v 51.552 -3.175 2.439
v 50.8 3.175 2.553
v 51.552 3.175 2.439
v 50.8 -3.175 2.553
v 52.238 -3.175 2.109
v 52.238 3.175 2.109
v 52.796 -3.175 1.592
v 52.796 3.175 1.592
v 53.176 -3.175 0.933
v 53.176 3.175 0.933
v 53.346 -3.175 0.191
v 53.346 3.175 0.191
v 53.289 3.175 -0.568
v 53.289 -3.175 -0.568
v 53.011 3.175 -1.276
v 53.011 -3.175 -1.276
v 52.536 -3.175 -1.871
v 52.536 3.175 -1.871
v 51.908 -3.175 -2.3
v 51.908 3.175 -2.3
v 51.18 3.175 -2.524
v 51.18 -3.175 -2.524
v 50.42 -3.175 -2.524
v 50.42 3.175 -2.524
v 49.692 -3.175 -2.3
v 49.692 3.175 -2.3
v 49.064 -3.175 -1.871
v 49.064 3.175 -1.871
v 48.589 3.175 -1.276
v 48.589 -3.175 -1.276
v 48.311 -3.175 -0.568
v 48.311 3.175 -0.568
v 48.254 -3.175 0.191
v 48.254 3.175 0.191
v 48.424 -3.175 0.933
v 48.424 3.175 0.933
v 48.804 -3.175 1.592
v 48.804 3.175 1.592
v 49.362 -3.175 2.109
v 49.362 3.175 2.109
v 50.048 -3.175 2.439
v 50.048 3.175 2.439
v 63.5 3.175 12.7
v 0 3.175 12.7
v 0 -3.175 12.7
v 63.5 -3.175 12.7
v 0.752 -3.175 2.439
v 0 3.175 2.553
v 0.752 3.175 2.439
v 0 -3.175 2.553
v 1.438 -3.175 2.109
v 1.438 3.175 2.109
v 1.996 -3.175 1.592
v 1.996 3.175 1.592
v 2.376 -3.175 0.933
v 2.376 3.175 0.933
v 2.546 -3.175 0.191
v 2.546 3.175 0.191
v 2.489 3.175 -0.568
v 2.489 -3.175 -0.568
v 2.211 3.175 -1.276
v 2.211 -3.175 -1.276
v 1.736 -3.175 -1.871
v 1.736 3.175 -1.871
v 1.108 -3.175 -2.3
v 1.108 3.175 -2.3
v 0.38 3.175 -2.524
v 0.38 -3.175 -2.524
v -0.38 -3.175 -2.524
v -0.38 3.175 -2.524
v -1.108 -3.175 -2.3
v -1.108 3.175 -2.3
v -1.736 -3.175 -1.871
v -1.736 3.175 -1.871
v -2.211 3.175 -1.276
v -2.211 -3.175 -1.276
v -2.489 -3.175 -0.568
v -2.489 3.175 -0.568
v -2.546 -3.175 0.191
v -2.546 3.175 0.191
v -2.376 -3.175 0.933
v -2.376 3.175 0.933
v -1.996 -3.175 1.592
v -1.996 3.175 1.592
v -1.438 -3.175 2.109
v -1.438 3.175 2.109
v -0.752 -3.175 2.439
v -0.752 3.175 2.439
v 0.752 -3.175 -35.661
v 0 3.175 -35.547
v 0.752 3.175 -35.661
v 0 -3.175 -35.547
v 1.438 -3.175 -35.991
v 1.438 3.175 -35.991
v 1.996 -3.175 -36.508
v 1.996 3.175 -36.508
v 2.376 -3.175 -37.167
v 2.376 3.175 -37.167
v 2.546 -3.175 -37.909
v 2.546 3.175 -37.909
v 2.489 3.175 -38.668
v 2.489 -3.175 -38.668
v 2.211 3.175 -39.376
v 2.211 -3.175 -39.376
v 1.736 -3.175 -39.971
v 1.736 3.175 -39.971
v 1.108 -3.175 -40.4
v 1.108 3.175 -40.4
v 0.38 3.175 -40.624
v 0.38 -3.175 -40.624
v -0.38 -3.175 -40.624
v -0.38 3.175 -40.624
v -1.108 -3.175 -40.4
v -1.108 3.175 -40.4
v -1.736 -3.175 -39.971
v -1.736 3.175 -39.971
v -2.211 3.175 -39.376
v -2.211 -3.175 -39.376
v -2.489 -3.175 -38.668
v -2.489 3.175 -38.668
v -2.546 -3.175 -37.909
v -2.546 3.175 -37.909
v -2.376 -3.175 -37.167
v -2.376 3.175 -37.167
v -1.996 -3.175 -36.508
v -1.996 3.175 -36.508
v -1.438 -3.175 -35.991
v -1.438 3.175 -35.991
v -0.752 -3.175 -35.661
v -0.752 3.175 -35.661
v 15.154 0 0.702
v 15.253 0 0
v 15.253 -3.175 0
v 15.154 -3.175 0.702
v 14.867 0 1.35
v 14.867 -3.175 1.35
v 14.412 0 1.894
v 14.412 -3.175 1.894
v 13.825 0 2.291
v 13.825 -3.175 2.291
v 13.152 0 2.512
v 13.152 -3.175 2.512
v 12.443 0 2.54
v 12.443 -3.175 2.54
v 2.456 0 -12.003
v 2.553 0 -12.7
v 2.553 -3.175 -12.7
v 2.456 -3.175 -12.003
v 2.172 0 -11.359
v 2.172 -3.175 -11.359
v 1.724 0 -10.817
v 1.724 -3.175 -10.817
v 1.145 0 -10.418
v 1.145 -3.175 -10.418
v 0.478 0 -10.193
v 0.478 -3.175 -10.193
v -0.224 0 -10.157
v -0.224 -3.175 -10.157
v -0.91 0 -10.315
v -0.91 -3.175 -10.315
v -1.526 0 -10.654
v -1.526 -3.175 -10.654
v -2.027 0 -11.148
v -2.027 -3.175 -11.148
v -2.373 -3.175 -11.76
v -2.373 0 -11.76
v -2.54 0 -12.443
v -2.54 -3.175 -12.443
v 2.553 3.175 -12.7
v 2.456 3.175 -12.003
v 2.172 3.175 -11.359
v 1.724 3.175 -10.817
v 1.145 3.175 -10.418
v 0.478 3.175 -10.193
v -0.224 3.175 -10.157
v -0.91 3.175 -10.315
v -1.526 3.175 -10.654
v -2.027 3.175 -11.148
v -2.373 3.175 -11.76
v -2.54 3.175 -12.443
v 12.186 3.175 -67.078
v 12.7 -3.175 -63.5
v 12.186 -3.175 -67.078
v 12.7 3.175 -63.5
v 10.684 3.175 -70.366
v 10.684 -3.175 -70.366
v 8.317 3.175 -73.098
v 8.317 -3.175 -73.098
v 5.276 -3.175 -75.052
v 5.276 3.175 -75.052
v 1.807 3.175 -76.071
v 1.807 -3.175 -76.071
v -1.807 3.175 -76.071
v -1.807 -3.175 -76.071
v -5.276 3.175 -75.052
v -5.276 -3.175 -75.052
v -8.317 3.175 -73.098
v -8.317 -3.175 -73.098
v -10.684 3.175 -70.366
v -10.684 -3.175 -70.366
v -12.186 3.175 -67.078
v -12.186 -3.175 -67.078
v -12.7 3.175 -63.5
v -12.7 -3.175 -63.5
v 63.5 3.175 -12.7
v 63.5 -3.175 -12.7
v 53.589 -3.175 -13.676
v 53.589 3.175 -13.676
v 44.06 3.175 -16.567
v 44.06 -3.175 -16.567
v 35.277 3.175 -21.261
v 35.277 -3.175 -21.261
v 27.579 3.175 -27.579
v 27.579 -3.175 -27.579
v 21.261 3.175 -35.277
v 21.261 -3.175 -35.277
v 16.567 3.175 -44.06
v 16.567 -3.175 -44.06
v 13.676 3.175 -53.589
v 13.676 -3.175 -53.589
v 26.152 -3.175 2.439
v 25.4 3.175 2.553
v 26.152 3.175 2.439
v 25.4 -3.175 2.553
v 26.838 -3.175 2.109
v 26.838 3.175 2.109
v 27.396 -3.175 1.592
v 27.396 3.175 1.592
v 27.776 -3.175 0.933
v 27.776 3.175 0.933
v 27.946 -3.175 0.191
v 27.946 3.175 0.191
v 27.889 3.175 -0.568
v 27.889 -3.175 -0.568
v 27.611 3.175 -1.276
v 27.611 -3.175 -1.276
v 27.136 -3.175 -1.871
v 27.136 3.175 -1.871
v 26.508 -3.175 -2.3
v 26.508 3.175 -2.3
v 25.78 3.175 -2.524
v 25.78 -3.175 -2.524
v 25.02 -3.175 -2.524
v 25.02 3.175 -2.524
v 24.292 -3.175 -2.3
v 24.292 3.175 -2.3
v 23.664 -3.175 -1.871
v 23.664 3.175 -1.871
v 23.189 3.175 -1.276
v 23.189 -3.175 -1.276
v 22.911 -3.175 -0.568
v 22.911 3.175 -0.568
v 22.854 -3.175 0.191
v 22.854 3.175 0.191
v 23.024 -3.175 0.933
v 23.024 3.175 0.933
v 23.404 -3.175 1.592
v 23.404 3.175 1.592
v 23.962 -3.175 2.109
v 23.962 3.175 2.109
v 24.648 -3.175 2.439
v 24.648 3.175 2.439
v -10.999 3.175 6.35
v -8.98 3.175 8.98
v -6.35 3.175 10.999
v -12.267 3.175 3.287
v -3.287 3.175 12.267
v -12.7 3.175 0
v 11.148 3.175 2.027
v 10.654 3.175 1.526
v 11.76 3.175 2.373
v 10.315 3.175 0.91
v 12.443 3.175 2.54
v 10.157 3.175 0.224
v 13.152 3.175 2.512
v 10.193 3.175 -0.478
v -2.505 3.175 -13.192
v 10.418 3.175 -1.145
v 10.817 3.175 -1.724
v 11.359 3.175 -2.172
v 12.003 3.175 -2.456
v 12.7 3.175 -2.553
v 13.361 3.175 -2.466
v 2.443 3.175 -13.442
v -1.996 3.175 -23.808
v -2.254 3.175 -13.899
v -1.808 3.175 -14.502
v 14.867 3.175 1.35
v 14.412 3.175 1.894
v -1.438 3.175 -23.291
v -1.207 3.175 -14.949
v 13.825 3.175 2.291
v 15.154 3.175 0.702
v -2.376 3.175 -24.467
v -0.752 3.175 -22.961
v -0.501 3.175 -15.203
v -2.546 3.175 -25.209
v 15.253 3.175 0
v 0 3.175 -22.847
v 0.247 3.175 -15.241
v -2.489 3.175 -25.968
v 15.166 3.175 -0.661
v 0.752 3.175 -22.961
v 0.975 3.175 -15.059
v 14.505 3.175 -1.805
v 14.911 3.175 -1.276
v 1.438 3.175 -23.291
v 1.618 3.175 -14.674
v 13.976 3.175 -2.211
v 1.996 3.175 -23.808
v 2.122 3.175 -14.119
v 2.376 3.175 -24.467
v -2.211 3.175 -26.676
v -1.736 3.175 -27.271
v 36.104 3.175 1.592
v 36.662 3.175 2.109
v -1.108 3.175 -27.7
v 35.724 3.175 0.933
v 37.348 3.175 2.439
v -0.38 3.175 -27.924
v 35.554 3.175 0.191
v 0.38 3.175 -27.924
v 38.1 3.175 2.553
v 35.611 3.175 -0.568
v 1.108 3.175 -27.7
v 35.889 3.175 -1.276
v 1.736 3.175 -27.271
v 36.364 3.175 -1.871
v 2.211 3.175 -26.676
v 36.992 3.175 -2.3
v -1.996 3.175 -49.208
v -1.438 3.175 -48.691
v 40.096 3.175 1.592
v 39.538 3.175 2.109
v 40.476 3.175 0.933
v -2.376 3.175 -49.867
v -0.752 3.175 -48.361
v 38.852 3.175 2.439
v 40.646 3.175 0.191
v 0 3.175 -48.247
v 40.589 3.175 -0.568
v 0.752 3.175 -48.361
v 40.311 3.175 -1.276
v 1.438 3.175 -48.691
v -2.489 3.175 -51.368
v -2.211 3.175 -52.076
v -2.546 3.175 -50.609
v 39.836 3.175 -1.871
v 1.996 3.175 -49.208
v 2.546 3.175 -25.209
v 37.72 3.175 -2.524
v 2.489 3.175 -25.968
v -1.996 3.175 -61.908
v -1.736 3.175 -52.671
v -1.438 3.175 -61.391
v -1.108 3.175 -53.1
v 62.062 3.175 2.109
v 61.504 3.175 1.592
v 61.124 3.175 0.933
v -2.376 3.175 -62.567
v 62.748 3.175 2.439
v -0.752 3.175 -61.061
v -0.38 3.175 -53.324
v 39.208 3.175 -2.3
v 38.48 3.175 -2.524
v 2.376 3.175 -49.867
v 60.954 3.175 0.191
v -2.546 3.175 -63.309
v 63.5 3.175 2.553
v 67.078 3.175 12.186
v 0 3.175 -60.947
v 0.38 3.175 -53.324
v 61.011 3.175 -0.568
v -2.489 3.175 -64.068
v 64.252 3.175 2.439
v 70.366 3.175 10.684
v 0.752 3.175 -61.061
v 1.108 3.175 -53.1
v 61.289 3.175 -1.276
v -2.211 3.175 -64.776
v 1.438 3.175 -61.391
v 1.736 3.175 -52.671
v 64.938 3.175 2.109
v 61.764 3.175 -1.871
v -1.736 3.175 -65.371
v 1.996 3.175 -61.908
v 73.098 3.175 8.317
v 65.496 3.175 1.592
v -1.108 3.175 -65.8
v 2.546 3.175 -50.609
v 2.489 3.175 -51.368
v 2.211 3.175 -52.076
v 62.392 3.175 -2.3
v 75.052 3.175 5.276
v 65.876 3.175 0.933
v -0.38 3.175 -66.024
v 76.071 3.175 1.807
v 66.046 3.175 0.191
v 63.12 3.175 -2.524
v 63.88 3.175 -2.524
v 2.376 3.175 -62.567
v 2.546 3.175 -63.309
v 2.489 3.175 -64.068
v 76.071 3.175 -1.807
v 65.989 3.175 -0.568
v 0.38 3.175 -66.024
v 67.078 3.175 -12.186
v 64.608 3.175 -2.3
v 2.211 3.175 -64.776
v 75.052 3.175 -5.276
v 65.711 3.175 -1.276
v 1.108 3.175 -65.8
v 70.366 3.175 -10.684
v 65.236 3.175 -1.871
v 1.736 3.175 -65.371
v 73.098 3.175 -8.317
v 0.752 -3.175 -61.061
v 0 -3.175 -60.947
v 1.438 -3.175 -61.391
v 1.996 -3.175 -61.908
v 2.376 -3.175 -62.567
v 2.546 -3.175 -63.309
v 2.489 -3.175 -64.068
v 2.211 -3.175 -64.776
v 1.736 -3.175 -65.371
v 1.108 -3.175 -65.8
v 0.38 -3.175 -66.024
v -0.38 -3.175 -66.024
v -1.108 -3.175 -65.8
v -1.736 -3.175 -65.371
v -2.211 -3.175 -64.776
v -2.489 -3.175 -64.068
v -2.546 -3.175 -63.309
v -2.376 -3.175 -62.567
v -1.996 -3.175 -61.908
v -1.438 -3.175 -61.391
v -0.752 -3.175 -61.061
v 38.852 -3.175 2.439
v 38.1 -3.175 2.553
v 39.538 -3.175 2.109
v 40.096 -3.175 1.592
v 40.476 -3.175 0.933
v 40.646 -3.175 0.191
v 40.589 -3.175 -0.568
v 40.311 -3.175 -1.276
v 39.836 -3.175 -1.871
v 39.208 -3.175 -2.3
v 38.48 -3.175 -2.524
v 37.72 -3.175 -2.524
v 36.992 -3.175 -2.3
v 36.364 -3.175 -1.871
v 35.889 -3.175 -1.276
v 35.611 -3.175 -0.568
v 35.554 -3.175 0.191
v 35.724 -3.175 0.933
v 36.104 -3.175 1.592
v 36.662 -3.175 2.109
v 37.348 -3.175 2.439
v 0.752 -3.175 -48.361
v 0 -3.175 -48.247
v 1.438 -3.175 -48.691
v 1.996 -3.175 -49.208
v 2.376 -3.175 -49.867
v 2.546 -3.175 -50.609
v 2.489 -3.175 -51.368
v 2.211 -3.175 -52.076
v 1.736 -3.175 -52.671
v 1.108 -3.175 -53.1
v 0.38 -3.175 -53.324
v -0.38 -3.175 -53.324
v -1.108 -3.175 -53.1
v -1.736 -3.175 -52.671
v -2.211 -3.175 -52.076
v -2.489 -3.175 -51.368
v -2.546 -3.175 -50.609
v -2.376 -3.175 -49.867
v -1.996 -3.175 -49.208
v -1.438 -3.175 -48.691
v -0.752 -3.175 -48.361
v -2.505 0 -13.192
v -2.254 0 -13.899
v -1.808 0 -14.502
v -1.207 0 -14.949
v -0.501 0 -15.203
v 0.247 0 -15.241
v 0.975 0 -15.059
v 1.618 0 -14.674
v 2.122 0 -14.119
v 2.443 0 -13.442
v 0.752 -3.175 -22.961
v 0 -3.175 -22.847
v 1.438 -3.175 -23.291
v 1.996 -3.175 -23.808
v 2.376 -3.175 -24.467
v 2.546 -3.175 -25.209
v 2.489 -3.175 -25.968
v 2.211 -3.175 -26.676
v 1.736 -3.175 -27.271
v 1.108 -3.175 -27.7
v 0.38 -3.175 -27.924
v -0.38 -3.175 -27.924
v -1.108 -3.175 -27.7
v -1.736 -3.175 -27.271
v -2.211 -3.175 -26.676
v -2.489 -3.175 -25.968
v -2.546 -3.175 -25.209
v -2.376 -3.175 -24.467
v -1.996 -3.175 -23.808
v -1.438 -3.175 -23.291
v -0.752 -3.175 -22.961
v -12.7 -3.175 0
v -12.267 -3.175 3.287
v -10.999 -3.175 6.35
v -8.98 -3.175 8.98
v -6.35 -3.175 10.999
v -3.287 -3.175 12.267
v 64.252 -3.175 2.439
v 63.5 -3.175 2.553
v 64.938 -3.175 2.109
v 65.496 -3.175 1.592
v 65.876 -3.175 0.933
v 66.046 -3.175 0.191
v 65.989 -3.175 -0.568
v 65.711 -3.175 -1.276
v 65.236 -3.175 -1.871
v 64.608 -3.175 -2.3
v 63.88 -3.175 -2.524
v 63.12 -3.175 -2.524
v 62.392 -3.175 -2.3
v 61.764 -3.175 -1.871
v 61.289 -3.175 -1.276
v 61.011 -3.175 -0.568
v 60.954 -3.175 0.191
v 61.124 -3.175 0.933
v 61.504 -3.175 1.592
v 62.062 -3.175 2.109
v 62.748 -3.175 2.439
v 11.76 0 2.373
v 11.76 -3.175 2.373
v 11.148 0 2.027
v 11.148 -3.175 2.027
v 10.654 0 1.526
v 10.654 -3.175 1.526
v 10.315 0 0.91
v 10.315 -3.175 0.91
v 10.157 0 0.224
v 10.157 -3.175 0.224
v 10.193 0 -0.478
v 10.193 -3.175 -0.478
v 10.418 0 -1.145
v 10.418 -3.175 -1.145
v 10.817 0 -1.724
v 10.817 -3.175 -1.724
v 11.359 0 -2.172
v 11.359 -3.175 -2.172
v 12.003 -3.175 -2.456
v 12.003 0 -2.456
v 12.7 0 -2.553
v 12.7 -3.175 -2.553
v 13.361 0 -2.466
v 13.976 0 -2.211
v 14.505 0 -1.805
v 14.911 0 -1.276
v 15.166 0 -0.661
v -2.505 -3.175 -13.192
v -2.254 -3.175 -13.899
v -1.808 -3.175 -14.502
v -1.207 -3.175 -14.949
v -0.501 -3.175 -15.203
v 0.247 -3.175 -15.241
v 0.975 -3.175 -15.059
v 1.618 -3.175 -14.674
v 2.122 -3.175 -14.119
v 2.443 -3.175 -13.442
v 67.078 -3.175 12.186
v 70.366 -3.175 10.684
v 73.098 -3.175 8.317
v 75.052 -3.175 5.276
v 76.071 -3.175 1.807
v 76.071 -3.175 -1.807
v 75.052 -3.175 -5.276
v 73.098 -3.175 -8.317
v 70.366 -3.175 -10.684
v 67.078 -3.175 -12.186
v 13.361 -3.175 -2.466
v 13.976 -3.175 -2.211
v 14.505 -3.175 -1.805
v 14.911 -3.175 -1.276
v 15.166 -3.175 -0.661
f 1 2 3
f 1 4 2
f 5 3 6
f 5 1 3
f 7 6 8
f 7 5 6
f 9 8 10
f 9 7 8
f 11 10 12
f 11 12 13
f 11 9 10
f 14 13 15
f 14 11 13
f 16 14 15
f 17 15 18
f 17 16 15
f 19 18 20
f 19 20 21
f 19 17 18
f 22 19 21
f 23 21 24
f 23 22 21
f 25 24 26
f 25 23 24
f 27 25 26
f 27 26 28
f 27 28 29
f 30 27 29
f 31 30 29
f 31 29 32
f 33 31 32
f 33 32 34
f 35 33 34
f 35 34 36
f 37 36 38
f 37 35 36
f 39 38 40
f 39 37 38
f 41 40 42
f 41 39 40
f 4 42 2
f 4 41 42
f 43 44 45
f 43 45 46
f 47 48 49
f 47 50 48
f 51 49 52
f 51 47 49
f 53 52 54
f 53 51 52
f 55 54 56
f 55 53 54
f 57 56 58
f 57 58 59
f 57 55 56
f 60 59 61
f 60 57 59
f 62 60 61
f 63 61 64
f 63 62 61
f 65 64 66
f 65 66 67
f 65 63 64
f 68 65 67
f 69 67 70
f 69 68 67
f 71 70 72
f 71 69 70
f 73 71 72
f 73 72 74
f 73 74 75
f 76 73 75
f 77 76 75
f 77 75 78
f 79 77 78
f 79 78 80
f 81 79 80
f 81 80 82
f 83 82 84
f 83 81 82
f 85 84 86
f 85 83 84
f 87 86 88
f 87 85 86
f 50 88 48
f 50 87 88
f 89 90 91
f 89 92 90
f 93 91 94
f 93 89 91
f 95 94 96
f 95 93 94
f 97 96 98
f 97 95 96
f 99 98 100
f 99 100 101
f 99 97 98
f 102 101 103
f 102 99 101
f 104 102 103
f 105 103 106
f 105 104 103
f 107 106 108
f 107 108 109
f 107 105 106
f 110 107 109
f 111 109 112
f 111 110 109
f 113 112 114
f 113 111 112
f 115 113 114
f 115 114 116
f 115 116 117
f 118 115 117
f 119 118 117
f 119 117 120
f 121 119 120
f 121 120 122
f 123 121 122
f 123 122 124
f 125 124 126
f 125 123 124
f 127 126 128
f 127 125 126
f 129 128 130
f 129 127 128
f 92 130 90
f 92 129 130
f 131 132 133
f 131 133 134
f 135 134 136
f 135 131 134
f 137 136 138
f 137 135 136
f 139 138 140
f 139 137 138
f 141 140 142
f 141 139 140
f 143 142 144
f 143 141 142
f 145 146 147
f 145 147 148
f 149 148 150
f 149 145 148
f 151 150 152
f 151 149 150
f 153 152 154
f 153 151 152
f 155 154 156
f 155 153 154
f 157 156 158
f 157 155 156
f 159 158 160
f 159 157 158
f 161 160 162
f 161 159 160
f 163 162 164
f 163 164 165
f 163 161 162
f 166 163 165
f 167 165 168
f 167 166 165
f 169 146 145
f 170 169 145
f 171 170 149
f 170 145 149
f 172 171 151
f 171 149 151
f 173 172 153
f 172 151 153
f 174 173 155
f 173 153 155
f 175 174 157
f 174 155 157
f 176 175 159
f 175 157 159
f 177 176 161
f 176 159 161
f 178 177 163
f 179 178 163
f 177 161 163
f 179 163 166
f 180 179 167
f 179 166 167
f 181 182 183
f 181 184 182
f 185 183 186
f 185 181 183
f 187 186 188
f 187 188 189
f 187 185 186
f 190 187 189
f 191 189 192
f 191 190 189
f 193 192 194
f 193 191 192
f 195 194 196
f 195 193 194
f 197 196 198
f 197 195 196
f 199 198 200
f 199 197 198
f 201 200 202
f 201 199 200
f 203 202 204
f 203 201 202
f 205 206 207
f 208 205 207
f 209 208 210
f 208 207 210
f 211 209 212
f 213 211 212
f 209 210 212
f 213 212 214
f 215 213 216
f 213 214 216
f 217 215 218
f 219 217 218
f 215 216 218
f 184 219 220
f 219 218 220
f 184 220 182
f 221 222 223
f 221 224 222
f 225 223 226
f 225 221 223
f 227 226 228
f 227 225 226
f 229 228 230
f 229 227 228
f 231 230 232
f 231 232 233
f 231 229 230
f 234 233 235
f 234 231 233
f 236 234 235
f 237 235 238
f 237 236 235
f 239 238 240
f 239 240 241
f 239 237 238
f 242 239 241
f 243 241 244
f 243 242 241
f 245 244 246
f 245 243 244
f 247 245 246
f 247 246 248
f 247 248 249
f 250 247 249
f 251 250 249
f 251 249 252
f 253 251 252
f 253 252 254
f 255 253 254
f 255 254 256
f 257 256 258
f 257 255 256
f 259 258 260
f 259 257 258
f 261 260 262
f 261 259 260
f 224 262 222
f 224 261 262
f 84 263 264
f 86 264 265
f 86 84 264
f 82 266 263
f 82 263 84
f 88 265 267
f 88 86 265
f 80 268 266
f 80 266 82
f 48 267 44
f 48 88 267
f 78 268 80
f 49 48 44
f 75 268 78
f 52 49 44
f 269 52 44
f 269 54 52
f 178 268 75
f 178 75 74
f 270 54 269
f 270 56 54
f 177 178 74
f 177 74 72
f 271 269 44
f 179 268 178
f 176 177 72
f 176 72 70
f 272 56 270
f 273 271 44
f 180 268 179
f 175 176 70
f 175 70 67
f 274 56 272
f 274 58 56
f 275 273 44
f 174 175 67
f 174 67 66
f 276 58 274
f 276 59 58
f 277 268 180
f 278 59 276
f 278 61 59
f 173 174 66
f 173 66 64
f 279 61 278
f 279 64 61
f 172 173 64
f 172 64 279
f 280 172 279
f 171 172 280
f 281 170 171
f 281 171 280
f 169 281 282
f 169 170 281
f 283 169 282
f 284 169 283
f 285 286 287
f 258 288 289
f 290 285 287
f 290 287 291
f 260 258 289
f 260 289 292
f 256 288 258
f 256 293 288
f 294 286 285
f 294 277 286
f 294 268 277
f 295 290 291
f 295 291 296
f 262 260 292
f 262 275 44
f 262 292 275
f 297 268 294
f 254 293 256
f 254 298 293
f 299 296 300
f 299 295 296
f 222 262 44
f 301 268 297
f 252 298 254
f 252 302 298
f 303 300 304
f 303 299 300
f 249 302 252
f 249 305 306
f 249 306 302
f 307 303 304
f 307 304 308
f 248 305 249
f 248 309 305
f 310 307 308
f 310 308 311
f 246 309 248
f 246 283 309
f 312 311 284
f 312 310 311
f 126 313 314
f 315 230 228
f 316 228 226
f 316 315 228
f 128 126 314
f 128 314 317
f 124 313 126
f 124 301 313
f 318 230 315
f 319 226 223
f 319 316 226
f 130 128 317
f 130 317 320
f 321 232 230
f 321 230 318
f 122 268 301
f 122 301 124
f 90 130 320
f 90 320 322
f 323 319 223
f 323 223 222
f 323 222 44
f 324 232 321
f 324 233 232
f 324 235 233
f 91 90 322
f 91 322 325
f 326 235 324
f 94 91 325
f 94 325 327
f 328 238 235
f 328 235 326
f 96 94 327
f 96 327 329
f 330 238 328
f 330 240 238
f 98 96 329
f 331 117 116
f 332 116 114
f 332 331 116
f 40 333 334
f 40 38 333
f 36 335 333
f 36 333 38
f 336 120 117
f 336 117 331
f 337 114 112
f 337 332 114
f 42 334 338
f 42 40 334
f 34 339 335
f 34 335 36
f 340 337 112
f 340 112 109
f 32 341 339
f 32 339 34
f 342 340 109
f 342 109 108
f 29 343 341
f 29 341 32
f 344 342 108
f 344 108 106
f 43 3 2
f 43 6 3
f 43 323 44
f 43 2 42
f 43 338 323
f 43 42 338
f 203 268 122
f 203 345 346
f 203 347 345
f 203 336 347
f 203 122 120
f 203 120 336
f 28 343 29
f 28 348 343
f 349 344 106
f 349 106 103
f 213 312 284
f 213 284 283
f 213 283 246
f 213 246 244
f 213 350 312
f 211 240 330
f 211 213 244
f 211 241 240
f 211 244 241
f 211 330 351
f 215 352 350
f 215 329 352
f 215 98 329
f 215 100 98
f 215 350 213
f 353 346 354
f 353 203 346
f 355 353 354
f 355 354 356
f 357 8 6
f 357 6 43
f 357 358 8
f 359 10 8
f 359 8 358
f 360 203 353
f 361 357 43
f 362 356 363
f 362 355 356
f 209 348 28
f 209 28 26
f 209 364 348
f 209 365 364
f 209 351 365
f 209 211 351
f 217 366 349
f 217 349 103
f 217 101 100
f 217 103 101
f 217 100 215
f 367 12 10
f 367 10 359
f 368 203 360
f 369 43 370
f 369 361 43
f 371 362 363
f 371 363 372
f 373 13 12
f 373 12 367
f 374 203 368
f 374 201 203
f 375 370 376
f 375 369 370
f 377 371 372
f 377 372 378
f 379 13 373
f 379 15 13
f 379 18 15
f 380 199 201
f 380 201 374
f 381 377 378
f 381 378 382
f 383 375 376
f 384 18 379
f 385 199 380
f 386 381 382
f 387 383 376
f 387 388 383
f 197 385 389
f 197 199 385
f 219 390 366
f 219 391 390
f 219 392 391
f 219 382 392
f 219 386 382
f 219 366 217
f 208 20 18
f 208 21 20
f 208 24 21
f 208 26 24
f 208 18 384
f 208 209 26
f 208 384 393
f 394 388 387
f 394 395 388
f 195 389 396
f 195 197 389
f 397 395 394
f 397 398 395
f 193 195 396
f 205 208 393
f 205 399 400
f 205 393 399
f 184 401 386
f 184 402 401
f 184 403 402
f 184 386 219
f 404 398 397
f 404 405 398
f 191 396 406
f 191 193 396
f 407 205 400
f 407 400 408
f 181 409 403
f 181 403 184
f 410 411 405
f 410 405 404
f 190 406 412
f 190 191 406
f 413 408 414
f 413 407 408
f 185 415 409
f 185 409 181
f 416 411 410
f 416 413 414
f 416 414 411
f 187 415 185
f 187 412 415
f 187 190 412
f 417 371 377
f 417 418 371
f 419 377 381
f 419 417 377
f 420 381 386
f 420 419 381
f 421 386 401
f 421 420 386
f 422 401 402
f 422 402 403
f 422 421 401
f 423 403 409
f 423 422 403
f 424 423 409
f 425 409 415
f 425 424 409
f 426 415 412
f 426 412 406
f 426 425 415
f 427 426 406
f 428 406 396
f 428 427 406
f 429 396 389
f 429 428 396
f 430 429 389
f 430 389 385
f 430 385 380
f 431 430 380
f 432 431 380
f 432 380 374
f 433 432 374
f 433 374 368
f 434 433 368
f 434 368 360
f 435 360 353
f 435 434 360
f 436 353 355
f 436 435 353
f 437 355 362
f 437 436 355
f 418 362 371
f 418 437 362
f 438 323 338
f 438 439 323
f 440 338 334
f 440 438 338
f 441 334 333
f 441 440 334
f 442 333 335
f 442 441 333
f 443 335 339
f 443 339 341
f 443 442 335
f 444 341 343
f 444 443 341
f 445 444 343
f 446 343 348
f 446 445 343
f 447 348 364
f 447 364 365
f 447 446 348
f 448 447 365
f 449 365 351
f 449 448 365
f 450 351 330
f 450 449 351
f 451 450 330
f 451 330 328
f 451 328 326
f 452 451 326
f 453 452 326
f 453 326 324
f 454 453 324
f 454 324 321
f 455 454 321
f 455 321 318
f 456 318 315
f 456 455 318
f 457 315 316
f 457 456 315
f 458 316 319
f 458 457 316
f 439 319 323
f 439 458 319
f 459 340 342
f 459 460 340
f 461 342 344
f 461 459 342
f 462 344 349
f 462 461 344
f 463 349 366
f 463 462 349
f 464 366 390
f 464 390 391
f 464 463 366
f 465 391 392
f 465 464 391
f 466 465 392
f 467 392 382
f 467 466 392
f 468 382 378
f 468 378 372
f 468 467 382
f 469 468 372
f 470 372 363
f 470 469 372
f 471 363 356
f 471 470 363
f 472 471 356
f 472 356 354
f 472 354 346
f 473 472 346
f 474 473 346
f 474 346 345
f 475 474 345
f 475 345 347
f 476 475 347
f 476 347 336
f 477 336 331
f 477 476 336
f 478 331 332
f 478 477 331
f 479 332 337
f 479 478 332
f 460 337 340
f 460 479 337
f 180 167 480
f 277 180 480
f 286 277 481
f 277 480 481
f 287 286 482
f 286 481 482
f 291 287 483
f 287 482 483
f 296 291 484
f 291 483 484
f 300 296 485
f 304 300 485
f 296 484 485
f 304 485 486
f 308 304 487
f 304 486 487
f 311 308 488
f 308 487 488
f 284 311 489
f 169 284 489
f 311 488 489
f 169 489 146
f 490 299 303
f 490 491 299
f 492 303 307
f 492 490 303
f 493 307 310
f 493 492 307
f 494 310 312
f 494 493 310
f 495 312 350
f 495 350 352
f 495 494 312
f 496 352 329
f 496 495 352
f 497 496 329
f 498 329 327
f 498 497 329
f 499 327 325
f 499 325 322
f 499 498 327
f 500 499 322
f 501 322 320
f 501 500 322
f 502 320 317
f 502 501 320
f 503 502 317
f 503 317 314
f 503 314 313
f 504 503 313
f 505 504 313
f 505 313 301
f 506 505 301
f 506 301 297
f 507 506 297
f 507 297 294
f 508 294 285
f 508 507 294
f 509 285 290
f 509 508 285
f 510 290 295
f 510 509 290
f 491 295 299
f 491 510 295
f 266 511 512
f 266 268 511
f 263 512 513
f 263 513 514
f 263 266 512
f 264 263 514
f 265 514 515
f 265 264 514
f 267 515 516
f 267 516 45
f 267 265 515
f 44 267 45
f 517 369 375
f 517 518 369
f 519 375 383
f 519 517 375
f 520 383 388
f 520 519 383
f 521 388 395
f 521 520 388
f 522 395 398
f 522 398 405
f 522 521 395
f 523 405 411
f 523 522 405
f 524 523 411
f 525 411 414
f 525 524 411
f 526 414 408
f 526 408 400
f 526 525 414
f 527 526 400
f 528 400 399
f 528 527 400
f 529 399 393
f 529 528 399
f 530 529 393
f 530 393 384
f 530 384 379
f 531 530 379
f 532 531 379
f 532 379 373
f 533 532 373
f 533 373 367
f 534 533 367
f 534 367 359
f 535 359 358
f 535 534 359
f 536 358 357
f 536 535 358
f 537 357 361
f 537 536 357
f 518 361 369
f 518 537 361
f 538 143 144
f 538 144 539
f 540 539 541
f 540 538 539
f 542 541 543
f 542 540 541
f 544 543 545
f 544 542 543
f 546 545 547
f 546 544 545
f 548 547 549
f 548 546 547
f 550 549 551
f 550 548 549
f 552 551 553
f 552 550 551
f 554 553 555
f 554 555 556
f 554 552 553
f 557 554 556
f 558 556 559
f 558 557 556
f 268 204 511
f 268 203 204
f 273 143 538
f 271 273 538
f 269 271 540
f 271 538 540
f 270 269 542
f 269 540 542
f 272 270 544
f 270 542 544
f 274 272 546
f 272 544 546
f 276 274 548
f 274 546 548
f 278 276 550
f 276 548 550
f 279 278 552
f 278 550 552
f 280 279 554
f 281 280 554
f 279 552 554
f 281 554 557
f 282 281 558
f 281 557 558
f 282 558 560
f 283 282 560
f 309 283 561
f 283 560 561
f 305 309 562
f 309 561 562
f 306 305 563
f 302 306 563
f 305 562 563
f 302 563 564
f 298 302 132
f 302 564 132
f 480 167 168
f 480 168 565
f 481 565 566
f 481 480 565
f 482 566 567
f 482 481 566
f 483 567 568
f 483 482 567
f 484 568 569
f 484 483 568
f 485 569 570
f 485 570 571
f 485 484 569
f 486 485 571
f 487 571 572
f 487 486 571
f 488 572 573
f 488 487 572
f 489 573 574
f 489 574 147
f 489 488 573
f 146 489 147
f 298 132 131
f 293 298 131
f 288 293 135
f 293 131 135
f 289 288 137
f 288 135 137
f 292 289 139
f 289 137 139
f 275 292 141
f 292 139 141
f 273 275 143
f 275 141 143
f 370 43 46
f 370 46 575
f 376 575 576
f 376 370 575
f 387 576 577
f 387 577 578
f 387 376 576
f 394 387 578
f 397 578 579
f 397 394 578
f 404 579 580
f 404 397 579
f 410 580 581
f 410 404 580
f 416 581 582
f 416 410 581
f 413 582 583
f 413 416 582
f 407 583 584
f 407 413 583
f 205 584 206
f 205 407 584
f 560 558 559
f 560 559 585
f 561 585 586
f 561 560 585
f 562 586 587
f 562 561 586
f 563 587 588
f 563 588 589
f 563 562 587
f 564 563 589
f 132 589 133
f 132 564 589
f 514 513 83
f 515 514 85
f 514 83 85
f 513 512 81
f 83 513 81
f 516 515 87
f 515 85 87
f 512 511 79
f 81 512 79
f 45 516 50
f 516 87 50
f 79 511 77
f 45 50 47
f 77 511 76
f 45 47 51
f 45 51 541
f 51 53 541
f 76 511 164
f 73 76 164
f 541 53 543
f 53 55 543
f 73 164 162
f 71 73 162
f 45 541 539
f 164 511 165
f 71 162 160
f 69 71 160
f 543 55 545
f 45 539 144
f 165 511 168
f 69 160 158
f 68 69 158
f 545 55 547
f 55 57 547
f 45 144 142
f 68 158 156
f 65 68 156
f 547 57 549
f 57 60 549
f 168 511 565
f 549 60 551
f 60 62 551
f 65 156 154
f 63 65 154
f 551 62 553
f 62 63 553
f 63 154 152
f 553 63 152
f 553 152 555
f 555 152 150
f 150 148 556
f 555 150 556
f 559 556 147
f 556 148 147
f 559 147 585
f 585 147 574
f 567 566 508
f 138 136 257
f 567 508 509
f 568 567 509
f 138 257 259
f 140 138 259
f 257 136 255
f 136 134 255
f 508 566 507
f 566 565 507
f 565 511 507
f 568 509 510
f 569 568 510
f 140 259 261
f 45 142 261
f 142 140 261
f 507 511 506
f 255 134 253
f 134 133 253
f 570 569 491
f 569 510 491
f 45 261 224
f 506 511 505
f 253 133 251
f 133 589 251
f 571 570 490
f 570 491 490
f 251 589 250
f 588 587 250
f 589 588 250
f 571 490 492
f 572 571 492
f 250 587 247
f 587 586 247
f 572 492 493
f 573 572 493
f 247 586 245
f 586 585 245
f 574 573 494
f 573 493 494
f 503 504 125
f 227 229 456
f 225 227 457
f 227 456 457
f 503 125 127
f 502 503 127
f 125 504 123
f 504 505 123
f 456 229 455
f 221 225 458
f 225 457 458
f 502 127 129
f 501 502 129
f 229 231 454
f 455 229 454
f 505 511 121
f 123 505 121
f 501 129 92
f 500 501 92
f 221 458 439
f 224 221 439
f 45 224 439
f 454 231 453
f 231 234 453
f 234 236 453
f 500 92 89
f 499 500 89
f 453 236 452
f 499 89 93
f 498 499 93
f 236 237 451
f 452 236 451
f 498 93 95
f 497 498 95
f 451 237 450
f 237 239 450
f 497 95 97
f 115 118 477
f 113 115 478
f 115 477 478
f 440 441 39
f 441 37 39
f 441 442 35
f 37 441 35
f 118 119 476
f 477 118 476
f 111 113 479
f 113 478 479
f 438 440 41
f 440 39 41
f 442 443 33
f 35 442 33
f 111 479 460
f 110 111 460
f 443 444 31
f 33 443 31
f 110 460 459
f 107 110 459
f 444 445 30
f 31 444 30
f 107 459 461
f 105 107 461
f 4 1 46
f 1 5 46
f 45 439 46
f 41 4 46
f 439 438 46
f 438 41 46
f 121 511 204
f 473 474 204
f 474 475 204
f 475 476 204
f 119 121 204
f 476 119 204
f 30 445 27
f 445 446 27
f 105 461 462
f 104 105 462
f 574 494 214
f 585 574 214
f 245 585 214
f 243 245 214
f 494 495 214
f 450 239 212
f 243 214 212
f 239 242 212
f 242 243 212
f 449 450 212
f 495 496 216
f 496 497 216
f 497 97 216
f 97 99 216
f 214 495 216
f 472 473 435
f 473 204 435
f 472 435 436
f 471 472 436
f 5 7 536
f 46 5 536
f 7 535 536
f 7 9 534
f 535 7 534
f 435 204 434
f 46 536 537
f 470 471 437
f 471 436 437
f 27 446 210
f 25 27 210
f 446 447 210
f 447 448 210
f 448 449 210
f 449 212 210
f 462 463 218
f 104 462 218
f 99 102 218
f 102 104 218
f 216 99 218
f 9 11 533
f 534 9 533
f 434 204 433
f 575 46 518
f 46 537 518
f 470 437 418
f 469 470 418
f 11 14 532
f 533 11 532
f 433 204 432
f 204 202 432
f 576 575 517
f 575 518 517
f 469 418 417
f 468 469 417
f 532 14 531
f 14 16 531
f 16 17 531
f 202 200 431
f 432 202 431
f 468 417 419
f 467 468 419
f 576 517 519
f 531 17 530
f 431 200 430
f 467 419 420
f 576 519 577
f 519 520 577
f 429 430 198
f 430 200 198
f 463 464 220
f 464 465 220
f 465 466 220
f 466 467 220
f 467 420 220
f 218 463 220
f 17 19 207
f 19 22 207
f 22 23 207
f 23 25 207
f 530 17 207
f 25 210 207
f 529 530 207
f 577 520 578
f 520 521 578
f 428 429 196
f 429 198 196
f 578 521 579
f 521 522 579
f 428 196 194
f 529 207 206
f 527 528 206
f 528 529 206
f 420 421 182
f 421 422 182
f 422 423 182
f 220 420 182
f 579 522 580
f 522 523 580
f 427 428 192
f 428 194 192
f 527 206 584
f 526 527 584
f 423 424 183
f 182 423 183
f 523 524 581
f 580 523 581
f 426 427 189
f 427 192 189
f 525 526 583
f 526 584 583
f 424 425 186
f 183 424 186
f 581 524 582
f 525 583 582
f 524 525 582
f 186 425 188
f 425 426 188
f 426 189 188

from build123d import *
from build123d.topology import SkipClean

# Parameters (mm, degrees)
SKETCH1_R           = 2.5527
BOSS_EXTRUDE1_DEPTH = 3.175


with BuildPart() as part:
    # Sketch1 → Boss-Extrude1 (new, symmetric)
    # profile 1 of 4: a face of its own
    with SkipClean():  # the faces are left unmerged after this step: merging them gives an invalid solid
        with BuildSketch(Plane(origin=(0, 0, 0), x_dir=(1, 0, 0), z_dir=(0, 1, 0))):
            with BuildLine():
                Line((-12.7, 63.5), (-12.7, 0))
                ThreePointArc((-12.7, 0), (-9.837305348, 8.032273868), (-2.539775829, 12.44345365))
                ThreePointArc((-2.539775829, 12.44345365), (-0.128435844, 15.24946691), (2.5527, 12.7))
                Line((2.5527, 12.7), (12.7, 12.7))
                Line((12.7, 12.7), (12.7, 63.5))
                ThreePointArc((12.7, 63.5), (0, 76.2), (-12.7, 63.5))
            make_face()
            with Locations(Location((0, 25.4, 0), (0, 0, 270))):
                Circle(SKETCH1_R, mode=Mode.SUBTRACT)
            with Locations(Location((0, 38.1, 0), (0, 0, 270))):
                Circle(SKETCH1_R, mode=Mode.SUBTRACT)
            with Locations(Location((0, 50.8, 0), (0, 0, 270))):
                Circle(SKETCH1_R, mode=Mode.SUBTRACT)
            with Locations(Location((0, 63.5, 0), (0, 0, 270))):
                Circle(SKETCH1_R, mode=Mode.SUBTRACT)
        # profile 2 of 4: a face of its own
        with BuildSketch(Plane(origin=(0, 0, 0), x_dir=(1, 0, 0), z_dir=(0, 1, 0))):
            with BuildLine():
                Line((12.7, 12.7), (63.5, 12.7))
                ThreePointArc((63.5, 12.7), (27.578975516, 27.578975516), (12.7, 63.5))
                Line((12.7, 63.5), (12.7, 12.7))
            make_face()
        # profile 3 of 4: a face of its own
        with BuildSketch(Plane(origin=(0, 0, 0), x_dir=(1, 0, 0), z_dir=(0, 1, 0))):
            with BuildLine():
                Line((0, -12.7), (63.5, -12.7))
                ThreePointArc((63.5, -12.7), (76.2, 0), (63.5, 12.7))
                Line((63.5, 12.7), (12.7, 12.7))
                Line((12.7, 12.7), (12.7, 2.5527))
                ThreePointArc((12.7, 2.5527), (14.50503148, 1.80503148), (15.2527, 0))
                ThreePointArc((15.2527, 0), (14.411927484, -1.893563196), (12.44345365, -2.539775829))
                ThreePointArc((12.44345365, -2.539775829), (8.032273868, -9.837305348), (0, -12.7))
            make_face()
            with Locations(Location((25.4, 0, 0), (0, 0, 270))):
                Circle(SKETCH1_R, mode=Mode.SUBTRACT)
            with Locations(Location((38.1, 0, 0), (0, 0, 270))):
                Circle(SKETCH1_R, mode=Mode.SUBTRACT)
            with Locations(Location((50.8, 0, 0), (0, 0, 270))):
                Circle(SKETCH1_R, mode=Mode.SUBTRACT)
            with Locations(Location((63.5, 0, 0), (0, 0, 270))):
                Circle(SKETCH1_R, mode=Mode.SUBTRACT)
        # profile 4 of 4: a face of its own
        with BuildSketch(Plane(origin=(0, 0, 0), x_dir=(1, 0, 0), z_dir=(0, 1, 0))):
            with BuildLine():
                ThreePointArc((-12.7, 0), (-8.980256121, -8.980256121), (0, -12.7))
                ThreePointArc((0, -12.7), (8.032273868, -9.837305348), (12.44345365, -2.539775829))
                ThreePointArc((12.44345365, -2.539775829), (10.15053309, 0.128435844), (12.7, 2.5527))
                Line((12.7, 2.5527), (12.7, 12.7))
                Line((12.7, 12.7), (2.5527, 12.7))
                ThreePointArc((2.5527, 12.7), (0.128435844, 10.15053309), (-2.539775829, 12.44345365))
                ThreePointArc((-2.539775829, 12.44345365), (-9.837305348, 8.032273868), (-12.7, 0))
            make_face()
            with Locations(Location((0, 0, 0), (0, 0, 270))):
                Circle(SKETCH1_R, mode=Mode.SUBTRACT)
        extrude(amount=BOSS_EXTRUDE1_DEPTH, both=True)


solid = part.part
